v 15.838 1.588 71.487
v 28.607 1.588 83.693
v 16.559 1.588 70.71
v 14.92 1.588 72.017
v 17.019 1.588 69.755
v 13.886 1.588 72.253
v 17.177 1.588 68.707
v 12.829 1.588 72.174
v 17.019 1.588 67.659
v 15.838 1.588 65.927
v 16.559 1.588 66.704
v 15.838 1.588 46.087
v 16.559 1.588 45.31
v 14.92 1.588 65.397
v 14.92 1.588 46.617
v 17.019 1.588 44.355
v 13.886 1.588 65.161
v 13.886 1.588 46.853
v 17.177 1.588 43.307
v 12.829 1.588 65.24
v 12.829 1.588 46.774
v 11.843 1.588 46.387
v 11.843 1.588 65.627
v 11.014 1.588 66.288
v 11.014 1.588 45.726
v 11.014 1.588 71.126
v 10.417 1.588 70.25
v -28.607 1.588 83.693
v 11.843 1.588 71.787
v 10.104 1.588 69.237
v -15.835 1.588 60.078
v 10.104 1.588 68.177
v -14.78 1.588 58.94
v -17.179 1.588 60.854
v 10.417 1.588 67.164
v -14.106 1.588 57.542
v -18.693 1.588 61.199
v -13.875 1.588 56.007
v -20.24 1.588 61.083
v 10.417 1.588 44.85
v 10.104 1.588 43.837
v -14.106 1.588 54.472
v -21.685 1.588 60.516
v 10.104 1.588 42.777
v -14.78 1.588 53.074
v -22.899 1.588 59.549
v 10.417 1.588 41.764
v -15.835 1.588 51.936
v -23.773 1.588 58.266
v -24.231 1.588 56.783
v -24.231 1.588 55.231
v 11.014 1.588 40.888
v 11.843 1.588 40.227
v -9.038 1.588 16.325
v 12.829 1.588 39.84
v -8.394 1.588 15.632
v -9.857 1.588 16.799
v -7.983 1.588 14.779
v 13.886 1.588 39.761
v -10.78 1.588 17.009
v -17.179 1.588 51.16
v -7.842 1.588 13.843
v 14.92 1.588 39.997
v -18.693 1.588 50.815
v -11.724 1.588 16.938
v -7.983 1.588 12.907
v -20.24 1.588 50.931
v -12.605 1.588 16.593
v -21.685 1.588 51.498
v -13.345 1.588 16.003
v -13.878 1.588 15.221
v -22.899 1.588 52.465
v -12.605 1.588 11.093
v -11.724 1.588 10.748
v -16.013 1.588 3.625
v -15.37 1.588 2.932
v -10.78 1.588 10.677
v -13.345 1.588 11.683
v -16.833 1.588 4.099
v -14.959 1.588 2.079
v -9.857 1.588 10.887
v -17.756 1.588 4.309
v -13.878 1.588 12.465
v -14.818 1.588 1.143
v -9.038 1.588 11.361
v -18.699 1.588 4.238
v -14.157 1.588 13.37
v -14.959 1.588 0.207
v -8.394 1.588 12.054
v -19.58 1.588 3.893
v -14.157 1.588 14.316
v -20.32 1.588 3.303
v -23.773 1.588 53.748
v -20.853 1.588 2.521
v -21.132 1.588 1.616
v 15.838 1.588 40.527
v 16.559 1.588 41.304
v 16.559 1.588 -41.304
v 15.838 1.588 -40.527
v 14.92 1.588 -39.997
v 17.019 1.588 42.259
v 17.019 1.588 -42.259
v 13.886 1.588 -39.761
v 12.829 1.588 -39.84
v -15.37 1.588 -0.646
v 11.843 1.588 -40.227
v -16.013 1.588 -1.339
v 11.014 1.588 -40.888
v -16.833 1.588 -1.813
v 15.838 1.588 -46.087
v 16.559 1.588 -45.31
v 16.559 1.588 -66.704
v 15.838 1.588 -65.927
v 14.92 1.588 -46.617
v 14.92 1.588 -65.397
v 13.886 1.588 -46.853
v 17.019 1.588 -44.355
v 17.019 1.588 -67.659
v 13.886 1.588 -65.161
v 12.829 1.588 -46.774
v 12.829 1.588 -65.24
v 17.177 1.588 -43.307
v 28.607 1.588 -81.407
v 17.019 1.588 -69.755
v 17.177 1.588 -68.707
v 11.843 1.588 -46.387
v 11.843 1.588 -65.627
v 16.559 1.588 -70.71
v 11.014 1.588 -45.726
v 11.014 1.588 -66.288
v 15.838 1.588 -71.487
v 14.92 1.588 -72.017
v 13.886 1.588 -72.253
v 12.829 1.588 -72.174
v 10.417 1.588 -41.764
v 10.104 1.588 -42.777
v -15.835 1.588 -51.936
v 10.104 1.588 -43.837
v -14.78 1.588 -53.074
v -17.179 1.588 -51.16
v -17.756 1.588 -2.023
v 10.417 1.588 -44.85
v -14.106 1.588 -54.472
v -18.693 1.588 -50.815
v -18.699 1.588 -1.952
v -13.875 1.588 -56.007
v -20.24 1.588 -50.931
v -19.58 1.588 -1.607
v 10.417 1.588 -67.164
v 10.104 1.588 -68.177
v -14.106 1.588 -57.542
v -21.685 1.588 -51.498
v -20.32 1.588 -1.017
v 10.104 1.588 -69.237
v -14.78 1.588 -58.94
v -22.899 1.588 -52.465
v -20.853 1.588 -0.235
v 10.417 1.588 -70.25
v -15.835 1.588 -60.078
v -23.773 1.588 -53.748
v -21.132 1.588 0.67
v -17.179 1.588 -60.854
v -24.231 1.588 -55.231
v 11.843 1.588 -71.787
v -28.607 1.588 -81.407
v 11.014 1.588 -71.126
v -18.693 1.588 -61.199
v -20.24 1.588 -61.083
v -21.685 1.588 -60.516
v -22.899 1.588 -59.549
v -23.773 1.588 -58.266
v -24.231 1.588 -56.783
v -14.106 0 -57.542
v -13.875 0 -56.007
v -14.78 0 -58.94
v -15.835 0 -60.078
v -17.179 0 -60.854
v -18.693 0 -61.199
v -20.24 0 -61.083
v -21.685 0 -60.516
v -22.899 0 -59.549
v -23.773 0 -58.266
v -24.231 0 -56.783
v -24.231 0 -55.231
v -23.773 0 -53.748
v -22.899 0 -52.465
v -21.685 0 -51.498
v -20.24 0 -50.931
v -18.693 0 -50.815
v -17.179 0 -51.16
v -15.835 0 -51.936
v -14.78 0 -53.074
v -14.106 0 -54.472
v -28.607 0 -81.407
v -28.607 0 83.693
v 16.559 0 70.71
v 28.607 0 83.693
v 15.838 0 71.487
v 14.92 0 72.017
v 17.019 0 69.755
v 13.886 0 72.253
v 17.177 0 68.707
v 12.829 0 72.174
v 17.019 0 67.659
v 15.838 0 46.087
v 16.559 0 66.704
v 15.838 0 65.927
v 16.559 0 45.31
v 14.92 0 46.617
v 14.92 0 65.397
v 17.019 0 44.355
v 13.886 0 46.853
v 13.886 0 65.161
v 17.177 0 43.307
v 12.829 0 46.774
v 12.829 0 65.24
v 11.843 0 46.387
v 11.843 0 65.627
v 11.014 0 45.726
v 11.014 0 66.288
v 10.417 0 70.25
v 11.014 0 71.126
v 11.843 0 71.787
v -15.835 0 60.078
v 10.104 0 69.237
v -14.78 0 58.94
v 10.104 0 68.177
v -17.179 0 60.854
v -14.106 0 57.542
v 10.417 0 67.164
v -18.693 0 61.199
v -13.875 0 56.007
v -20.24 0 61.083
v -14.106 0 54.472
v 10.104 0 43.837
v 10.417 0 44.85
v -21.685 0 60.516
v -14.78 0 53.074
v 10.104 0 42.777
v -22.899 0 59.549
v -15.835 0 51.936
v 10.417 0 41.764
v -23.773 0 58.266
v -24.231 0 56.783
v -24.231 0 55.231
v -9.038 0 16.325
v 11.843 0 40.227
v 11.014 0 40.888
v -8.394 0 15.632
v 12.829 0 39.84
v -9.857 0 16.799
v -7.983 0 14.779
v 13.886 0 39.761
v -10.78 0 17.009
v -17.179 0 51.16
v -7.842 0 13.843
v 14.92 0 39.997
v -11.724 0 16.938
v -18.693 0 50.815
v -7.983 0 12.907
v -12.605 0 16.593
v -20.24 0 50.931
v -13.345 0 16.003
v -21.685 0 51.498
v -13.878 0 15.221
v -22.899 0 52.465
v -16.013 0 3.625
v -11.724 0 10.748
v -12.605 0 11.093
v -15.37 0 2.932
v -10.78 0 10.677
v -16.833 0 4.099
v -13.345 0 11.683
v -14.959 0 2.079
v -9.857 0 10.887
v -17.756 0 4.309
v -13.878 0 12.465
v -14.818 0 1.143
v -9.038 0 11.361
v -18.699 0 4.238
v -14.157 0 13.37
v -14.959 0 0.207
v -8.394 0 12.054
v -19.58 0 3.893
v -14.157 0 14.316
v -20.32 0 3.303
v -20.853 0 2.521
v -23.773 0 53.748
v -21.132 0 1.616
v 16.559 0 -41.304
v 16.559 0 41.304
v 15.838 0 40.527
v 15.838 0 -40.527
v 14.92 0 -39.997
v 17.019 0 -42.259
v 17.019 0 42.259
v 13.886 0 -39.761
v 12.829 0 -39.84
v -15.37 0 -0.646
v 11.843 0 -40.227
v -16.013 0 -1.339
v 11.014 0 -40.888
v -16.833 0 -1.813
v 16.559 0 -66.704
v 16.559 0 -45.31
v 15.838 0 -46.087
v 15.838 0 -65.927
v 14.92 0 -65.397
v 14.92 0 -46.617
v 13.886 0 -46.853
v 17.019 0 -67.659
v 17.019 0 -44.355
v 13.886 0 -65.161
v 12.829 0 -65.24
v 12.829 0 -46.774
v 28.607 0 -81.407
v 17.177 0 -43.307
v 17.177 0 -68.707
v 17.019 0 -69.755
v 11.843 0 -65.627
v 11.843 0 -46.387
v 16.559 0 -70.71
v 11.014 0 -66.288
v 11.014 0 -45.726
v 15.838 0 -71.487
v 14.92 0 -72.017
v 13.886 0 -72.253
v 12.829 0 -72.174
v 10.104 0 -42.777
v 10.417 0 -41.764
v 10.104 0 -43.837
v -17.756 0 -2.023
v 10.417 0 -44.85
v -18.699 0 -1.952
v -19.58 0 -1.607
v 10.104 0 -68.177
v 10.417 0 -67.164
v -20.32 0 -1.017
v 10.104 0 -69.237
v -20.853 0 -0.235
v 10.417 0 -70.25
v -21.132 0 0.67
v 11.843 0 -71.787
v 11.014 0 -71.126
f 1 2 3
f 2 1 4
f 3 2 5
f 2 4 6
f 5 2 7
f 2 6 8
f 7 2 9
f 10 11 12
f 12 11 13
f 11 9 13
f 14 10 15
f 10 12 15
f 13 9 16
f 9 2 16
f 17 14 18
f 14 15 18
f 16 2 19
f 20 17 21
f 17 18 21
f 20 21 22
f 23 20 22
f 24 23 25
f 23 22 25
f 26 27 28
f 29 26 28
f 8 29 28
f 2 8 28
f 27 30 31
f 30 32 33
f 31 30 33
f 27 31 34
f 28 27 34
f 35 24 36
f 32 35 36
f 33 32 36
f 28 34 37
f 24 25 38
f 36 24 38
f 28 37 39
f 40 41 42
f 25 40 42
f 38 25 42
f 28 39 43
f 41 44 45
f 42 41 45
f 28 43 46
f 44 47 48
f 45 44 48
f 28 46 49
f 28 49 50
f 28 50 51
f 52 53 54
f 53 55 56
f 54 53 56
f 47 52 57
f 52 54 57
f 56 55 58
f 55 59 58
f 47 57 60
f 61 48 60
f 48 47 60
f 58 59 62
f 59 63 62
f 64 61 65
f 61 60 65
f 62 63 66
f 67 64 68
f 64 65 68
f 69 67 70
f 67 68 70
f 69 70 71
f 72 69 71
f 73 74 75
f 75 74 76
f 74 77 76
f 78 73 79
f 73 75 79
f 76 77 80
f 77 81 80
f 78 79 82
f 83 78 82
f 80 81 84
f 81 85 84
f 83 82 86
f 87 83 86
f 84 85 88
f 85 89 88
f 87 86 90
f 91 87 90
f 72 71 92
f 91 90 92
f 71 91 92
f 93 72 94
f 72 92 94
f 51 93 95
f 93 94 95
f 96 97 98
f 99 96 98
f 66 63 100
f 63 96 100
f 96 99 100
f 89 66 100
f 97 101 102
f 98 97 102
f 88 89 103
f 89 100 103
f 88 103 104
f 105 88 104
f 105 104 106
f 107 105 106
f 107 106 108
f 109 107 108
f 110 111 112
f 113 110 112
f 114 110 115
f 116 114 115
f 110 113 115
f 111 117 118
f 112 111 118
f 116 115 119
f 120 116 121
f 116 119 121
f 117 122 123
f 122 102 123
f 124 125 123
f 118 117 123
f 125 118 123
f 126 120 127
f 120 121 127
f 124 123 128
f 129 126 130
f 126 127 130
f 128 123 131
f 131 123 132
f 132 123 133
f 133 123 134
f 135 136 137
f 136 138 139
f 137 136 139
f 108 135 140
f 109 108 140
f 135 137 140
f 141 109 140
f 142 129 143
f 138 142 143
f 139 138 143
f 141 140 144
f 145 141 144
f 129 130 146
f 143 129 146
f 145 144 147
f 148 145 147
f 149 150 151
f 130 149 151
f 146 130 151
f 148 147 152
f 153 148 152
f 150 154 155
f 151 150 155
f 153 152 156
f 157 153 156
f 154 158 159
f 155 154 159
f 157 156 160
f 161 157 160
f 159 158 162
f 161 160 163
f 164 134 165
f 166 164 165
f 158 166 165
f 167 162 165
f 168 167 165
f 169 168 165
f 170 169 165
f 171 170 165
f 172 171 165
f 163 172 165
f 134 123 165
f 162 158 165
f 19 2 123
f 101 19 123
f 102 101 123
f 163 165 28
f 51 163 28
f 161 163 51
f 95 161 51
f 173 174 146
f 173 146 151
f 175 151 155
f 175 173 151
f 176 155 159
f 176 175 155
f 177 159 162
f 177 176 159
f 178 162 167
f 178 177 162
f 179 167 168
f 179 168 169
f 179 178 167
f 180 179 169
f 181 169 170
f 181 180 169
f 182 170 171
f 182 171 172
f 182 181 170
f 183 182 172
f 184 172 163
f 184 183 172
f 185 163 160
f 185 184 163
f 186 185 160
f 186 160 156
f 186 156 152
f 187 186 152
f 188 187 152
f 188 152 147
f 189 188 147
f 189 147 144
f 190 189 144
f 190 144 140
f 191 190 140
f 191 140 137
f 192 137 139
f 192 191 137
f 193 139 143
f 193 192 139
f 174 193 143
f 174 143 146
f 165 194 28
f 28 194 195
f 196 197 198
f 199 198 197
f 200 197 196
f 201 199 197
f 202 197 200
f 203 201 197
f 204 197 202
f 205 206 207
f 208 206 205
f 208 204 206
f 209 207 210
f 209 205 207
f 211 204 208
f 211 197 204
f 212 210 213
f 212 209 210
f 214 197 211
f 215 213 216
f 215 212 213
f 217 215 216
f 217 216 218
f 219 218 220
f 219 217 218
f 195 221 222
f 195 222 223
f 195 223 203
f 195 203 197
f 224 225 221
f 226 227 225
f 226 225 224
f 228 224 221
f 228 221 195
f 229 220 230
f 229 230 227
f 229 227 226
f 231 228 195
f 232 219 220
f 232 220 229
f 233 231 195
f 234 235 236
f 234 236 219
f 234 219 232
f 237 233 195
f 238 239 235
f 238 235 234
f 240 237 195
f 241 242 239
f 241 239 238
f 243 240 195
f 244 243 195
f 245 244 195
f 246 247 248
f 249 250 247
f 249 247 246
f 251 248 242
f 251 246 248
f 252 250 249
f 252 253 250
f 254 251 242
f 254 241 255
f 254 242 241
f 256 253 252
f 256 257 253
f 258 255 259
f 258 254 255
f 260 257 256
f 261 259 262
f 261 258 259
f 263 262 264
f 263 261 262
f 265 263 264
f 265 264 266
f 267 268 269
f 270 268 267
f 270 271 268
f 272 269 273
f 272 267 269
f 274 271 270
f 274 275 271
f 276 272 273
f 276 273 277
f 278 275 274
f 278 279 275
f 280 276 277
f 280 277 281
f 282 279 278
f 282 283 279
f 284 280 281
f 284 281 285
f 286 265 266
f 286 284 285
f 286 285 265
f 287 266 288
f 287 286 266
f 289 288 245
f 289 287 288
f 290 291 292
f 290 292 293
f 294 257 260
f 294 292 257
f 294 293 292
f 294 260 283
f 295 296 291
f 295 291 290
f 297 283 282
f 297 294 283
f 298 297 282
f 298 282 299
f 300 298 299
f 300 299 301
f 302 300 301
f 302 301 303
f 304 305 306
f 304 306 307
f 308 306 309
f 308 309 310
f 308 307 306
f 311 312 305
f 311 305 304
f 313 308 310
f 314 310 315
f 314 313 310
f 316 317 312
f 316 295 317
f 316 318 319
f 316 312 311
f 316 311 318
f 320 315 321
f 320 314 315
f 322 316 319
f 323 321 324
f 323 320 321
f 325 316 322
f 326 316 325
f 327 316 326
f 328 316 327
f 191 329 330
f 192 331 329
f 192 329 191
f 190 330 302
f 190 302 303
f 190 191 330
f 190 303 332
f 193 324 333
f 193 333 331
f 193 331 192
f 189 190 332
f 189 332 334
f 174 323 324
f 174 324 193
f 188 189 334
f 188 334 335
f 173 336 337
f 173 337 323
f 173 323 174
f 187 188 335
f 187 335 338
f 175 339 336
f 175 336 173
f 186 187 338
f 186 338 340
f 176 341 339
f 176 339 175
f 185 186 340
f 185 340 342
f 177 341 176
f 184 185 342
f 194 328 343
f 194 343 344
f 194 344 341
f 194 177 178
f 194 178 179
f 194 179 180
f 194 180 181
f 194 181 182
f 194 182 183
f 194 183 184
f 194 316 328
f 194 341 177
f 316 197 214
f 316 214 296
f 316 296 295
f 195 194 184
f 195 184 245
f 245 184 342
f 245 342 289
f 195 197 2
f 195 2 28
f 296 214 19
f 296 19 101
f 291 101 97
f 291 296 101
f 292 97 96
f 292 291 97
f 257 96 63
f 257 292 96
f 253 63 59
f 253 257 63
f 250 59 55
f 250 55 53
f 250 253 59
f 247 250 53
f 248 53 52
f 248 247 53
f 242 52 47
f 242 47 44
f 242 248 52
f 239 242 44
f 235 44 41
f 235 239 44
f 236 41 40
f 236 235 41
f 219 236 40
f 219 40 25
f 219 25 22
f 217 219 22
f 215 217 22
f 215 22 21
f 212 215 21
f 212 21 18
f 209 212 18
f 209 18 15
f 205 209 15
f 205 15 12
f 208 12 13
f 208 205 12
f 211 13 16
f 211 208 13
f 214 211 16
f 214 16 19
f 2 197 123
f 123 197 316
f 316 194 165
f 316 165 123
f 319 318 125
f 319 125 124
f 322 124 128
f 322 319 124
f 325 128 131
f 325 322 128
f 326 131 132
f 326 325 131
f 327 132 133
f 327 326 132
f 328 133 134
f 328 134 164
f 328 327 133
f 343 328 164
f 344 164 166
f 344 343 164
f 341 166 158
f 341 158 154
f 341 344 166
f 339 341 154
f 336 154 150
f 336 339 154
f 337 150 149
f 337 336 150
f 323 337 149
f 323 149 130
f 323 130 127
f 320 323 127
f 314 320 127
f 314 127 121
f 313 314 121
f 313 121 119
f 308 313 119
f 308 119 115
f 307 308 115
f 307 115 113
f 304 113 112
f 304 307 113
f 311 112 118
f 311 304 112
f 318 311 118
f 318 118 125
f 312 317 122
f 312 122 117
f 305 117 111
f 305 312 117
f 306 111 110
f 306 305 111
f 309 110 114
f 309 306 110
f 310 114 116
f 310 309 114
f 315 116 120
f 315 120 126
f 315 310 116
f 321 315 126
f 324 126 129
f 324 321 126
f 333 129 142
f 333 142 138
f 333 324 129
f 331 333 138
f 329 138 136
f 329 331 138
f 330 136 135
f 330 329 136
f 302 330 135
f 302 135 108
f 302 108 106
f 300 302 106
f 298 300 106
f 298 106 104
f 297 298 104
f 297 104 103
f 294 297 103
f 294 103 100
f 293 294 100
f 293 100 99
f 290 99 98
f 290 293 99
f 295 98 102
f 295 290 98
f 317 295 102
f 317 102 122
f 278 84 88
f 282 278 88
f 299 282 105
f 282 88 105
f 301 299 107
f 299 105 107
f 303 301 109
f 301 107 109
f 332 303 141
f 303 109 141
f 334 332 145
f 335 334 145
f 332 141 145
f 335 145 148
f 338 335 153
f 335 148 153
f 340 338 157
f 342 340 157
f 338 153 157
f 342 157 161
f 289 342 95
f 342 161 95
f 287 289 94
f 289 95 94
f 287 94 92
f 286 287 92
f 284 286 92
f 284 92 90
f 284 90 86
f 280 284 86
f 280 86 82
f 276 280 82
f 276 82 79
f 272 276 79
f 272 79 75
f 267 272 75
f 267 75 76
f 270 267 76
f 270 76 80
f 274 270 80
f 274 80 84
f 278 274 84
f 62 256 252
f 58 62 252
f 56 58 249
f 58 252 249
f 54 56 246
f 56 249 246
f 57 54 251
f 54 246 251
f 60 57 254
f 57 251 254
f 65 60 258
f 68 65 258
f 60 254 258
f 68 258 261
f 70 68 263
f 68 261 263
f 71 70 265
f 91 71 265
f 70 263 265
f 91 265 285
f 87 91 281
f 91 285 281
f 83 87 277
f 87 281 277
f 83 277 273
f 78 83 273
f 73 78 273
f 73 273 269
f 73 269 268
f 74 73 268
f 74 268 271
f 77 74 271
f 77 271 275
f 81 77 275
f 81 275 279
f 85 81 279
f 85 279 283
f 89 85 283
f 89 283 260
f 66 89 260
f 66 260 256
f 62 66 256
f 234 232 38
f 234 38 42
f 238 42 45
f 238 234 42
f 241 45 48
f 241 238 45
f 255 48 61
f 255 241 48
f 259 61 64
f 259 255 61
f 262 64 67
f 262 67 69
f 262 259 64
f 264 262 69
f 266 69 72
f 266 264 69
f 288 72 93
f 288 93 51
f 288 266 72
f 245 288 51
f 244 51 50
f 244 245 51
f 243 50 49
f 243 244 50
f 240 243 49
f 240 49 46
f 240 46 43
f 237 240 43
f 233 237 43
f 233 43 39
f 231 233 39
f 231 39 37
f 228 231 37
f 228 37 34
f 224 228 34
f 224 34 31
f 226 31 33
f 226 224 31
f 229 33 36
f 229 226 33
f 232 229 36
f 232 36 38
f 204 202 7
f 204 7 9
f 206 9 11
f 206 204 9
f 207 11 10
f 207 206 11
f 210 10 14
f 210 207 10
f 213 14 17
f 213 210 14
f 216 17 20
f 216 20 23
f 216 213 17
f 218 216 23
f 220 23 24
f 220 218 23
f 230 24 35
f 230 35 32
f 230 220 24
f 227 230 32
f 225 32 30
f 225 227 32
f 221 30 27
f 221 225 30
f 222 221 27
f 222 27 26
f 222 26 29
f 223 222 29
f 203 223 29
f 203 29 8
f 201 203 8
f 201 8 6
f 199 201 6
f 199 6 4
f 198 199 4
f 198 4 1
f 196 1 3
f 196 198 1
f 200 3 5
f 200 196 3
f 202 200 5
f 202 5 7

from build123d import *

# Parameters (mm, degrees)
SKETCH1_R           = 5.207
SKETCH1_R_2         = 3.556
BOSS_EXTRUDE1_DEPTH = 1.5875
SKETCH2_R           = 3.175
CUT_EXTRUDE1_DEPTH  = 2.5875
SKETCH3_R           = 3.175
CUT_EXTRUDE2_DEPTH  = 2.5875


with BuildPart() as part:
    # Sketch1 → Boss-Extrude1 (new body)
    with BuildSketch(Plane(origin=(0, 0, 0), x_dir=(1, 0, 0), z_dir=(0, 1, 0))):
        Polygon((-28.60675, 81.407), (28.60675, 81.407), (28.60675, -81.407), (28.60675, -83.693), (-28.60675, -83.693), (-28.60675, -81.407), align=None)
        with Locations((-19.08175, 56.007)):
            Circle(SKETCH1_R, mode=Mode.SUBTRACT)
        with Locations((-19.08175, -56.007)):
            Circle(SKETCH1_R, mode=Mode.SUBTRACT)
        with Locations((13.62075, 68.707)):
            Circle(SKETCH1_R_2, mode=Mode.SUBTRACT)
        with Locations((13.62075, 43.307)):
            Circle(SKETCH1_R_2, mode=Mode.SUBTRACT)
        with Locations((13.62075, -43.307)):
            Circle(SKETCH1_R_2, mode=Mode.SUBTRACT)
        with Locations((13.62075, -68.707)):
            Circle(SKETCH1_R_2, mode=Mode.SUBTRACT)
    extrude(amount=BOSS_EXTRUDE1_DEPTH)

    # Sketch2 → Cut-Extrude1 (cut, through all)
    with BuildSketch(Plane(origin=(0, 1.5875, 0), x_dir=(1, 0, 0), z_dir=(0, 1, 0))):
        with Locations((-17.992815678, -1.143)):
            Circle(SKETCH2_R)
    extrude(amount=-CUT_EXTRUDE1_DEPTH, mode=Mode.SUBTRACT)

    # Sketch3 → Cut-Extrude2 (cut, through all)
    with BuildSketch(Plane.XZ):
        with Locations((-11.01725, 13.843)):
            Circle(SKETCH3_R)
    extrude(amount=-CUT_EXTRUDE2_DEPTH, mode=Mode.SUBTRACT)


solid = part.part
